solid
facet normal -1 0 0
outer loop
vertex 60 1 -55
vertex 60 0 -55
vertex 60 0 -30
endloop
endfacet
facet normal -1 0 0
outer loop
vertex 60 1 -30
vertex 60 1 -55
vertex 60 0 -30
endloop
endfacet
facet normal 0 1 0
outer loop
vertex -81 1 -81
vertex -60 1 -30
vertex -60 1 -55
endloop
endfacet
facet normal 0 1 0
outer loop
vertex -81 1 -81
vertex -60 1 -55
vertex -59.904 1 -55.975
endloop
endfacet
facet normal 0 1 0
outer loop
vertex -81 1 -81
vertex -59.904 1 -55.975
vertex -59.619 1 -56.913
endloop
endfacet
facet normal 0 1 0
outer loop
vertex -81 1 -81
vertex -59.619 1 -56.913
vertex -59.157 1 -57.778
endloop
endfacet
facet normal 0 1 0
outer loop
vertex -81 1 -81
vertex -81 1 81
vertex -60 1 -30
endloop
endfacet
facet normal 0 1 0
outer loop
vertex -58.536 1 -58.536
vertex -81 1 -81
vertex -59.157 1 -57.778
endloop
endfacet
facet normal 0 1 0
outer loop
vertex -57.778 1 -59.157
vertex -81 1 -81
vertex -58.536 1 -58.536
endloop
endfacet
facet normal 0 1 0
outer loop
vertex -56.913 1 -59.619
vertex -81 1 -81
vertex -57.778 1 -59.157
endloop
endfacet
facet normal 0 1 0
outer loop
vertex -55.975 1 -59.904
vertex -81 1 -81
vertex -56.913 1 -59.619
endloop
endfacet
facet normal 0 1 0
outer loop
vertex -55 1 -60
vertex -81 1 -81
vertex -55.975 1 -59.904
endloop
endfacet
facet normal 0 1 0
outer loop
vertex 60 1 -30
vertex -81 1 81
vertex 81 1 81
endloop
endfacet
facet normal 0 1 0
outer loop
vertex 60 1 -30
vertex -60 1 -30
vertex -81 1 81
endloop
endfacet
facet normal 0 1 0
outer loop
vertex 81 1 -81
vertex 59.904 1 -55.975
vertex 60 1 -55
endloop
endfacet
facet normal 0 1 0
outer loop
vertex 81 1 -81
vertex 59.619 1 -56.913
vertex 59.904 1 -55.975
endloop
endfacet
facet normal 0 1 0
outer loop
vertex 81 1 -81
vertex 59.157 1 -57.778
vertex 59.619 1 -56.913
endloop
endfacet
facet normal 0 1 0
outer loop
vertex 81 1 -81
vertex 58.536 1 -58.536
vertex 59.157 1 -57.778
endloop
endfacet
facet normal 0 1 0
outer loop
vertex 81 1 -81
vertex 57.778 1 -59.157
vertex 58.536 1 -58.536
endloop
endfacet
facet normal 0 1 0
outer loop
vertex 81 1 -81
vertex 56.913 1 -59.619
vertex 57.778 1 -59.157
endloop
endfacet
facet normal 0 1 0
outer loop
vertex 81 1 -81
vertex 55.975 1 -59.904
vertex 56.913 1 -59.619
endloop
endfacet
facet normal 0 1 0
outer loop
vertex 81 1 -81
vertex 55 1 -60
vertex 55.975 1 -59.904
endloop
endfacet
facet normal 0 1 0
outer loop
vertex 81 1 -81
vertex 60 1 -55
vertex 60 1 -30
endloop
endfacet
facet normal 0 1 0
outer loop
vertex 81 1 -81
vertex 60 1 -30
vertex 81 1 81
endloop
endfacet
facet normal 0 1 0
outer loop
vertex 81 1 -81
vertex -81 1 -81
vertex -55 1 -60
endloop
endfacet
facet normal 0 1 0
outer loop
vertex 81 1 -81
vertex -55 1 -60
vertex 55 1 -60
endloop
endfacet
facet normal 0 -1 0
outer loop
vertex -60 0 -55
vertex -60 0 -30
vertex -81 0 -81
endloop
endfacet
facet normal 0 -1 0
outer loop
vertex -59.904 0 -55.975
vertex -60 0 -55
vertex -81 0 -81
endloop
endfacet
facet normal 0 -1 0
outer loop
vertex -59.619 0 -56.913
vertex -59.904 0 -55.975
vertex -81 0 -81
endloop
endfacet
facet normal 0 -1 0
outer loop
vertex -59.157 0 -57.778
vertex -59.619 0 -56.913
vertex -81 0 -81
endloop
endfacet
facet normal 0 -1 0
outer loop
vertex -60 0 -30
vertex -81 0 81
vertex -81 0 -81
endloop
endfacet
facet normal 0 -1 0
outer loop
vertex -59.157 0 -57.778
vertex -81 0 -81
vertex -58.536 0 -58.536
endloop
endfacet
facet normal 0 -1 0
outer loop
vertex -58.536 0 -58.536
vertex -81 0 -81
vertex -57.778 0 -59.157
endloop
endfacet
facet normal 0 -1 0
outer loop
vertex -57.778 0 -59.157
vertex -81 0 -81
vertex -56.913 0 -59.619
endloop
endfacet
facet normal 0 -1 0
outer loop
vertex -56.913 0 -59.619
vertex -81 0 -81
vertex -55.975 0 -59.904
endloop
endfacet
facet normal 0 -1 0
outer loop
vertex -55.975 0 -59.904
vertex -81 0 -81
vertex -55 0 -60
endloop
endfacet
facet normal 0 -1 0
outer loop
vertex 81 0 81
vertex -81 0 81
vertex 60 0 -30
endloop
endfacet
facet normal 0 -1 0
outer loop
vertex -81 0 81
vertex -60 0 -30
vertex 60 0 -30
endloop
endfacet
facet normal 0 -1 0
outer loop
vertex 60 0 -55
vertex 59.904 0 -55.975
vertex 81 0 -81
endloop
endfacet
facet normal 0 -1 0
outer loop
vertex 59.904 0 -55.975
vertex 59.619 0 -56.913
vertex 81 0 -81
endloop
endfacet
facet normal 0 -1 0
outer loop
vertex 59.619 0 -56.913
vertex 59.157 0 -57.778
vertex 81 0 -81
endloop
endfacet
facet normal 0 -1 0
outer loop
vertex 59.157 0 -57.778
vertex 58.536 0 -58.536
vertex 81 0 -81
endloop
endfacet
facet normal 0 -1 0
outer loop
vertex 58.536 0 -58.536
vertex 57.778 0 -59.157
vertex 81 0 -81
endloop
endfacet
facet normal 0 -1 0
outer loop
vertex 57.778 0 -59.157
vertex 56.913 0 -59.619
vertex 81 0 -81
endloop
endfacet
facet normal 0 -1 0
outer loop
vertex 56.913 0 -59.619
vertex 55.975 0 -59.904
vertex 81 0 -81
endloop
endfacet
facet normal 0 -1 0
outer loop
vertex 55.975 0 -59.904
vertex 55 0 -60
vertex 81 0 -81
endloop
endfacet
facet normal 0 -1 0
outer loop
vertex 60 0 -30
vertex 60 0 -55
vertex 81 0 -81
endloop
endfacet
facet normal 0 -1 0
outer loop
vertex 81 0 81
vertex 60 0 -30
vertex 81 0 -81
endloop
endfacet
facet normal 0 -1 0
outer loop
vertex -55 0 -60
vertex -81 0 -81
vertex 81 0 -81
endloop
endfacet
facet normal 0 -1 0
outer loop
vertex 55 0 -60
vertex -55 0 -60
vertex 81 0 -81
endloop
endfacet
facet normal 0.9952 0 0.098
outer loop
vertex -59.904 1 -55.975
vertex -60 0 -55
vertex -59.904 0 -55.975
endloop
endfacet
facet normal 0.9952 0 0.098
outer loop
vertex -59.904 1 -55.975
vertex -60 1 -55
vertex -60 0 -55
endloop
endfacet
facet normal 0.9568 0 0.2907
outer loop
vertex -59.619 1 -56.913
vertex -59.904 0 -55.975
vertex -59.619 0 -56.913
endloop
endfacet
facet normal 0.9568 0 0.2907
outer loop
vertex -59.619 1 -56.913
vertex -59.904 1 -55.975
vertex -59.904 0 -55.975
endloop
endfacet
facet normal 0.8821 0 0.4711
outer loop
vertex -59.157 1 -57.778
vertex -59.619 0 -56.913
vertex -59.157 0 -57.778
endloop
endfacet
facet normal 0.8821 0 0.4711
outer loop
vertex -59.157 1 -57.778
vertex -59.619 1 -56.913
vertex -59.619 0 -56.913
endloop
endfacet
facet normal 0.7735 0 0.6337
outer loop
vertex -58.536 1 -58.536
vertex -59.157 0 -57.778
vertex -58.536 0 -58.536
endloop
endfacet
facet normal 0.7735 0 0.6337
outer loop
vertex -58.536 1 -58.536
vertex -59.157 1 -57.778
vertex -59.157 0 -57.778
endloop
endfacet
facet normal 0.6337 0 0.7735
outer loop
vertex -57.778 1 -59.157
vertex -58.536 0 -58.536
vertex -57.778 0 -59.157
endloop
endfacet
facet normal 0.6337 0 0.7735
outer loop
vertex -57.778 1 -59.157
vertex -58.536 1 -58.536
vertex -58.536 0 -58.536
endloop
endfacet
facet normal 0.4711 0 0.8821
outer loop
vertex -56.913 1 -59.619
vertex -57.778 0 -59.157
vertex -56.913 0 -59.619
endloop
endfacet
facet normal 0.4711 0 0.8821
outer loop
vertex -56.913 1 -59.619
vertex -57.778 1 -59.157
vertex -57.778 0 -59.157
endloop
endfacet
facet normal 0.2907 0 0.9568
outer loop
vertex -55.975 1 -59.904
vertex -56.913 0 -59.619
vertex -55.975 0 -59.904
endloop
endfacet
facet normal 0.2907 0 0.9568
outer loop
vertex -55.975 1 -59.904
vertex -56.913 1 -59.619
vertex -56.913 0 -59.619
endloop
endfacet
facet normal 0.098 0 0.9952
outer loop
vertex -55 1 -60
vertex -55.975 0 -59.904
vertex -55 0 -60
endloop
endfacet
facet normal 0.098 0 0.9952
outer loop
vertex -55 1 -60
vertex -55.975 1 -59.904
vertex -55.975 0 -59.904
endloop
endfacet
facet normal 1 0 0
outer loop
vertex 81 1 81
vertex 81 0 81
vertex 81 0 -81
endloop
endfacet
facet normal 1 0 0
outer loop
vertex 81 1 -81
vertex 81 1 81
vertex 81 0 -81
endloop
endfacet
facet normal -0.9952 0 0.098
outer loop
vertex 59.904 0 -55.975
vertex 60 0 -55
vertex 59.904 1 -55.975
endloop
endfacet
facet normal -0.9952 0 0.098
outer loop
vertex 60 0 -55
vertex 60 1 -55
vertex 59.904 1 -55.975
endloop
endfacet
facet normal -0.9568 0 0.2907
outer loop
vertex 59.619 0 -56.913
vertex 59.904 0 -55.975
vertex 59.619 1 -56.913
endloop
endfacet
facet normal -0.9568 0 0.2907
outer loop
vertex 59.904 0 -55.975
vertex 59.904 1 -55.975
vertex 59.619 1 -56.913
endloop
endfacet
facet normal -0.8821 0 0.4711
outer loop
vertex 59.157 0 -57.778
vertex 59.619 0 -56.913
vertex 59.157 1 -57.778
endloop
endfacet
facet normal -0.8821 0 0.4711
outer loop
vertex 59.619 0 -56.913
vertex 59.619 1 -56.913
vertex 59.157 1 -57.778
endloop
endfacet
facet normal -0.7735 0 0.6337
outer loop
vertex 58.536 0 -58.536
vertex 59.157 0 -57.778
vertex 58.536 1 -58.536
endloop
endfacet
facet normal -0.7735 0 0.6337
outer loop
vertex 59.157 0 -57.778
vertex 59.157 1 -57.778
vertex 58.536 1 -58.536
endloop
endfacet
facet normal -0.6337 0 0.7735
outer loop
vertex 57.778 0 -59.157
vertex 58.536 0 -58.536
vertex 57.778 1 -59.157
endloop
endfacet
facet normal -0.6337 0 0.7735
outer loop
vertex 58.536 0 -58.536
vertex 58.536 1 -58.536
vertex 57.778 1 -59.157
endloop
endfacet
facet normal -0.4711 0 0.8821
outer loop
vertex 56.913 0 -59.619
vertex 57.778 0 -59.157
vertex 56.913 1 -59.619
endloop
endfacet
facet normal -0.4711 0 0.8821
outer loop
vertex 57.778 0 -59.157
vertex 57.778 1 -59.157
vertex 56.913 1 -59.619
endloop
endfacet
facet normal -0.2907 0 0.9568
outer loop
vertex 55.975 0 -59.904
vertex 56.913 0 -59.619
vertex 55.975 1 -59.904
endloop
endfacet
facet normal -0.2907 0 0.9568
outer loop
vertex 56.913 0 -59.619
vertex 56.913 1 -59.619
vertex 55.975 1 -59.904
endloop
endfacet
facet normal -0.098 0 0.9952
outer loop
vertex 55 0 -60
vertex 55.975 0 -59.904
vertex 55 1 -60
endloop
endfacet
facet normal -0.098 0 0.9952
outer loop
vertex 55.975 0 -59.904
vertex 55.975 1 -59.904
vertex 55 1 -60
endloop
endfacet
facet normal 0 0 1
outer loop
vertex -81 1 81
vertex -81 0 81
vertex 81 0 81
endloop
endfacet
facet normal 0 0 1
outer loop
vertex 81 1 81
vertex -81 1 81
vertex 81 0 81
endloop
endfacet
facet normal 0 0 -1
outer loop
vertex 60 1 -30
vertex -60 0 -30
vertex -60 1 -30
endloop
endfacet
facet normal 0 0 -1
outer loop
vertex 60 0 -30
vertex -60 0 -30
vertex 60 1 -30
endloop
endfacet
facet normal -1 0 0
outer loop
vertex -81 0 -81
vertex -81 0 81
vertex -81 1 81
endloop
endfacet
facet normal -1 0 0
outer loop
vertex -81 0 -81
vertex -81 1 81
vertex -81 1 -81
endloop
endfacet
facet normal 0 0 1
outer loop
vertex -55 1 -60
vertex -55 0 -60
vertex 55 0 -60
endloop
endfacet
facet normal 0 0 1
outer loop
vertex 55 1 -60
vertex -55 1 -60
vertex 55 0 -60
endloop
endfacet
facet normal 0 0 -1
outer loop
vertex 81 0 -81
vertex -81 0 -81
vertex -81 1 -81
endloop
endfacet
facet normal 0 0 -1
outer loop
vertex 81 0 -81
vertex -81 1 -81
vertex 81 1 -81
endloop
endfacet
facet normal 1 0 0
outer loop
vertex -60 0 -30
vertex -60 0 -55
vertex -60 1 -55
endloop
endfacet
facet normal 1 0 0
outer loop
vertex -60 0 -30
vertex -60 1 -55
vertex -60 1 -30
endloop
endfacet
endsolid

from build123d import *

# Parameters (mm, degrees)
SKETCH_1_W          = 162
SKETCH_1_H          = 162
EXTRUDE_1_DEPTH     = 1
CUT_EXTRUDE_1_REACH = 3
SKETCH_2_W          = 120
SKETCH_2_H          = 30
FILLET_1_R          = 5


with BuildPart() as part:
    # 草图1 → 凸台-拉伸1 (new body)
    with BuildSketch(Plane(origin=(0, 0, 0), x_dir=(1, 0, 0), z_dir=(0, 1, 0))):
        Rectangle(SKETCH_1_W, SKETCH_1_H)
    extrude(amount=EXTRUDE_1_DEPTH)

    # 草图2 → 切除-拉伸1 (cut, up to next)
    with BuildSketch(Plane.XZ, mode=Mode.PRIVATE) as cut_extrude_1_sk1:
        with Locations((0, -45)):
            Rectangle(SKETCH_2_W, SKETCH_2_H)
    cut_extrude_1_tool1 = extrude(cut_extrude_1_sk1.sketch, amount=-CUT_EXTRUDE_1_REACH, mode=Mode.PRIVATE) & part.part
    add(cut_extrude_1_tool1.solids().sort_by_distance((0, 0, -45))[0], mode=Mode.SUBTRACT)

    # 圆角1
    fillet_1_edges = [part.edges().sort_by_distance(p)[0] for p in [
        (60, 0.5, -60),
        (-60, 0.5, -60),
    ]]
    fillet(fillet_1_edges, radius=FILLET_1_R)


solid = part.part
